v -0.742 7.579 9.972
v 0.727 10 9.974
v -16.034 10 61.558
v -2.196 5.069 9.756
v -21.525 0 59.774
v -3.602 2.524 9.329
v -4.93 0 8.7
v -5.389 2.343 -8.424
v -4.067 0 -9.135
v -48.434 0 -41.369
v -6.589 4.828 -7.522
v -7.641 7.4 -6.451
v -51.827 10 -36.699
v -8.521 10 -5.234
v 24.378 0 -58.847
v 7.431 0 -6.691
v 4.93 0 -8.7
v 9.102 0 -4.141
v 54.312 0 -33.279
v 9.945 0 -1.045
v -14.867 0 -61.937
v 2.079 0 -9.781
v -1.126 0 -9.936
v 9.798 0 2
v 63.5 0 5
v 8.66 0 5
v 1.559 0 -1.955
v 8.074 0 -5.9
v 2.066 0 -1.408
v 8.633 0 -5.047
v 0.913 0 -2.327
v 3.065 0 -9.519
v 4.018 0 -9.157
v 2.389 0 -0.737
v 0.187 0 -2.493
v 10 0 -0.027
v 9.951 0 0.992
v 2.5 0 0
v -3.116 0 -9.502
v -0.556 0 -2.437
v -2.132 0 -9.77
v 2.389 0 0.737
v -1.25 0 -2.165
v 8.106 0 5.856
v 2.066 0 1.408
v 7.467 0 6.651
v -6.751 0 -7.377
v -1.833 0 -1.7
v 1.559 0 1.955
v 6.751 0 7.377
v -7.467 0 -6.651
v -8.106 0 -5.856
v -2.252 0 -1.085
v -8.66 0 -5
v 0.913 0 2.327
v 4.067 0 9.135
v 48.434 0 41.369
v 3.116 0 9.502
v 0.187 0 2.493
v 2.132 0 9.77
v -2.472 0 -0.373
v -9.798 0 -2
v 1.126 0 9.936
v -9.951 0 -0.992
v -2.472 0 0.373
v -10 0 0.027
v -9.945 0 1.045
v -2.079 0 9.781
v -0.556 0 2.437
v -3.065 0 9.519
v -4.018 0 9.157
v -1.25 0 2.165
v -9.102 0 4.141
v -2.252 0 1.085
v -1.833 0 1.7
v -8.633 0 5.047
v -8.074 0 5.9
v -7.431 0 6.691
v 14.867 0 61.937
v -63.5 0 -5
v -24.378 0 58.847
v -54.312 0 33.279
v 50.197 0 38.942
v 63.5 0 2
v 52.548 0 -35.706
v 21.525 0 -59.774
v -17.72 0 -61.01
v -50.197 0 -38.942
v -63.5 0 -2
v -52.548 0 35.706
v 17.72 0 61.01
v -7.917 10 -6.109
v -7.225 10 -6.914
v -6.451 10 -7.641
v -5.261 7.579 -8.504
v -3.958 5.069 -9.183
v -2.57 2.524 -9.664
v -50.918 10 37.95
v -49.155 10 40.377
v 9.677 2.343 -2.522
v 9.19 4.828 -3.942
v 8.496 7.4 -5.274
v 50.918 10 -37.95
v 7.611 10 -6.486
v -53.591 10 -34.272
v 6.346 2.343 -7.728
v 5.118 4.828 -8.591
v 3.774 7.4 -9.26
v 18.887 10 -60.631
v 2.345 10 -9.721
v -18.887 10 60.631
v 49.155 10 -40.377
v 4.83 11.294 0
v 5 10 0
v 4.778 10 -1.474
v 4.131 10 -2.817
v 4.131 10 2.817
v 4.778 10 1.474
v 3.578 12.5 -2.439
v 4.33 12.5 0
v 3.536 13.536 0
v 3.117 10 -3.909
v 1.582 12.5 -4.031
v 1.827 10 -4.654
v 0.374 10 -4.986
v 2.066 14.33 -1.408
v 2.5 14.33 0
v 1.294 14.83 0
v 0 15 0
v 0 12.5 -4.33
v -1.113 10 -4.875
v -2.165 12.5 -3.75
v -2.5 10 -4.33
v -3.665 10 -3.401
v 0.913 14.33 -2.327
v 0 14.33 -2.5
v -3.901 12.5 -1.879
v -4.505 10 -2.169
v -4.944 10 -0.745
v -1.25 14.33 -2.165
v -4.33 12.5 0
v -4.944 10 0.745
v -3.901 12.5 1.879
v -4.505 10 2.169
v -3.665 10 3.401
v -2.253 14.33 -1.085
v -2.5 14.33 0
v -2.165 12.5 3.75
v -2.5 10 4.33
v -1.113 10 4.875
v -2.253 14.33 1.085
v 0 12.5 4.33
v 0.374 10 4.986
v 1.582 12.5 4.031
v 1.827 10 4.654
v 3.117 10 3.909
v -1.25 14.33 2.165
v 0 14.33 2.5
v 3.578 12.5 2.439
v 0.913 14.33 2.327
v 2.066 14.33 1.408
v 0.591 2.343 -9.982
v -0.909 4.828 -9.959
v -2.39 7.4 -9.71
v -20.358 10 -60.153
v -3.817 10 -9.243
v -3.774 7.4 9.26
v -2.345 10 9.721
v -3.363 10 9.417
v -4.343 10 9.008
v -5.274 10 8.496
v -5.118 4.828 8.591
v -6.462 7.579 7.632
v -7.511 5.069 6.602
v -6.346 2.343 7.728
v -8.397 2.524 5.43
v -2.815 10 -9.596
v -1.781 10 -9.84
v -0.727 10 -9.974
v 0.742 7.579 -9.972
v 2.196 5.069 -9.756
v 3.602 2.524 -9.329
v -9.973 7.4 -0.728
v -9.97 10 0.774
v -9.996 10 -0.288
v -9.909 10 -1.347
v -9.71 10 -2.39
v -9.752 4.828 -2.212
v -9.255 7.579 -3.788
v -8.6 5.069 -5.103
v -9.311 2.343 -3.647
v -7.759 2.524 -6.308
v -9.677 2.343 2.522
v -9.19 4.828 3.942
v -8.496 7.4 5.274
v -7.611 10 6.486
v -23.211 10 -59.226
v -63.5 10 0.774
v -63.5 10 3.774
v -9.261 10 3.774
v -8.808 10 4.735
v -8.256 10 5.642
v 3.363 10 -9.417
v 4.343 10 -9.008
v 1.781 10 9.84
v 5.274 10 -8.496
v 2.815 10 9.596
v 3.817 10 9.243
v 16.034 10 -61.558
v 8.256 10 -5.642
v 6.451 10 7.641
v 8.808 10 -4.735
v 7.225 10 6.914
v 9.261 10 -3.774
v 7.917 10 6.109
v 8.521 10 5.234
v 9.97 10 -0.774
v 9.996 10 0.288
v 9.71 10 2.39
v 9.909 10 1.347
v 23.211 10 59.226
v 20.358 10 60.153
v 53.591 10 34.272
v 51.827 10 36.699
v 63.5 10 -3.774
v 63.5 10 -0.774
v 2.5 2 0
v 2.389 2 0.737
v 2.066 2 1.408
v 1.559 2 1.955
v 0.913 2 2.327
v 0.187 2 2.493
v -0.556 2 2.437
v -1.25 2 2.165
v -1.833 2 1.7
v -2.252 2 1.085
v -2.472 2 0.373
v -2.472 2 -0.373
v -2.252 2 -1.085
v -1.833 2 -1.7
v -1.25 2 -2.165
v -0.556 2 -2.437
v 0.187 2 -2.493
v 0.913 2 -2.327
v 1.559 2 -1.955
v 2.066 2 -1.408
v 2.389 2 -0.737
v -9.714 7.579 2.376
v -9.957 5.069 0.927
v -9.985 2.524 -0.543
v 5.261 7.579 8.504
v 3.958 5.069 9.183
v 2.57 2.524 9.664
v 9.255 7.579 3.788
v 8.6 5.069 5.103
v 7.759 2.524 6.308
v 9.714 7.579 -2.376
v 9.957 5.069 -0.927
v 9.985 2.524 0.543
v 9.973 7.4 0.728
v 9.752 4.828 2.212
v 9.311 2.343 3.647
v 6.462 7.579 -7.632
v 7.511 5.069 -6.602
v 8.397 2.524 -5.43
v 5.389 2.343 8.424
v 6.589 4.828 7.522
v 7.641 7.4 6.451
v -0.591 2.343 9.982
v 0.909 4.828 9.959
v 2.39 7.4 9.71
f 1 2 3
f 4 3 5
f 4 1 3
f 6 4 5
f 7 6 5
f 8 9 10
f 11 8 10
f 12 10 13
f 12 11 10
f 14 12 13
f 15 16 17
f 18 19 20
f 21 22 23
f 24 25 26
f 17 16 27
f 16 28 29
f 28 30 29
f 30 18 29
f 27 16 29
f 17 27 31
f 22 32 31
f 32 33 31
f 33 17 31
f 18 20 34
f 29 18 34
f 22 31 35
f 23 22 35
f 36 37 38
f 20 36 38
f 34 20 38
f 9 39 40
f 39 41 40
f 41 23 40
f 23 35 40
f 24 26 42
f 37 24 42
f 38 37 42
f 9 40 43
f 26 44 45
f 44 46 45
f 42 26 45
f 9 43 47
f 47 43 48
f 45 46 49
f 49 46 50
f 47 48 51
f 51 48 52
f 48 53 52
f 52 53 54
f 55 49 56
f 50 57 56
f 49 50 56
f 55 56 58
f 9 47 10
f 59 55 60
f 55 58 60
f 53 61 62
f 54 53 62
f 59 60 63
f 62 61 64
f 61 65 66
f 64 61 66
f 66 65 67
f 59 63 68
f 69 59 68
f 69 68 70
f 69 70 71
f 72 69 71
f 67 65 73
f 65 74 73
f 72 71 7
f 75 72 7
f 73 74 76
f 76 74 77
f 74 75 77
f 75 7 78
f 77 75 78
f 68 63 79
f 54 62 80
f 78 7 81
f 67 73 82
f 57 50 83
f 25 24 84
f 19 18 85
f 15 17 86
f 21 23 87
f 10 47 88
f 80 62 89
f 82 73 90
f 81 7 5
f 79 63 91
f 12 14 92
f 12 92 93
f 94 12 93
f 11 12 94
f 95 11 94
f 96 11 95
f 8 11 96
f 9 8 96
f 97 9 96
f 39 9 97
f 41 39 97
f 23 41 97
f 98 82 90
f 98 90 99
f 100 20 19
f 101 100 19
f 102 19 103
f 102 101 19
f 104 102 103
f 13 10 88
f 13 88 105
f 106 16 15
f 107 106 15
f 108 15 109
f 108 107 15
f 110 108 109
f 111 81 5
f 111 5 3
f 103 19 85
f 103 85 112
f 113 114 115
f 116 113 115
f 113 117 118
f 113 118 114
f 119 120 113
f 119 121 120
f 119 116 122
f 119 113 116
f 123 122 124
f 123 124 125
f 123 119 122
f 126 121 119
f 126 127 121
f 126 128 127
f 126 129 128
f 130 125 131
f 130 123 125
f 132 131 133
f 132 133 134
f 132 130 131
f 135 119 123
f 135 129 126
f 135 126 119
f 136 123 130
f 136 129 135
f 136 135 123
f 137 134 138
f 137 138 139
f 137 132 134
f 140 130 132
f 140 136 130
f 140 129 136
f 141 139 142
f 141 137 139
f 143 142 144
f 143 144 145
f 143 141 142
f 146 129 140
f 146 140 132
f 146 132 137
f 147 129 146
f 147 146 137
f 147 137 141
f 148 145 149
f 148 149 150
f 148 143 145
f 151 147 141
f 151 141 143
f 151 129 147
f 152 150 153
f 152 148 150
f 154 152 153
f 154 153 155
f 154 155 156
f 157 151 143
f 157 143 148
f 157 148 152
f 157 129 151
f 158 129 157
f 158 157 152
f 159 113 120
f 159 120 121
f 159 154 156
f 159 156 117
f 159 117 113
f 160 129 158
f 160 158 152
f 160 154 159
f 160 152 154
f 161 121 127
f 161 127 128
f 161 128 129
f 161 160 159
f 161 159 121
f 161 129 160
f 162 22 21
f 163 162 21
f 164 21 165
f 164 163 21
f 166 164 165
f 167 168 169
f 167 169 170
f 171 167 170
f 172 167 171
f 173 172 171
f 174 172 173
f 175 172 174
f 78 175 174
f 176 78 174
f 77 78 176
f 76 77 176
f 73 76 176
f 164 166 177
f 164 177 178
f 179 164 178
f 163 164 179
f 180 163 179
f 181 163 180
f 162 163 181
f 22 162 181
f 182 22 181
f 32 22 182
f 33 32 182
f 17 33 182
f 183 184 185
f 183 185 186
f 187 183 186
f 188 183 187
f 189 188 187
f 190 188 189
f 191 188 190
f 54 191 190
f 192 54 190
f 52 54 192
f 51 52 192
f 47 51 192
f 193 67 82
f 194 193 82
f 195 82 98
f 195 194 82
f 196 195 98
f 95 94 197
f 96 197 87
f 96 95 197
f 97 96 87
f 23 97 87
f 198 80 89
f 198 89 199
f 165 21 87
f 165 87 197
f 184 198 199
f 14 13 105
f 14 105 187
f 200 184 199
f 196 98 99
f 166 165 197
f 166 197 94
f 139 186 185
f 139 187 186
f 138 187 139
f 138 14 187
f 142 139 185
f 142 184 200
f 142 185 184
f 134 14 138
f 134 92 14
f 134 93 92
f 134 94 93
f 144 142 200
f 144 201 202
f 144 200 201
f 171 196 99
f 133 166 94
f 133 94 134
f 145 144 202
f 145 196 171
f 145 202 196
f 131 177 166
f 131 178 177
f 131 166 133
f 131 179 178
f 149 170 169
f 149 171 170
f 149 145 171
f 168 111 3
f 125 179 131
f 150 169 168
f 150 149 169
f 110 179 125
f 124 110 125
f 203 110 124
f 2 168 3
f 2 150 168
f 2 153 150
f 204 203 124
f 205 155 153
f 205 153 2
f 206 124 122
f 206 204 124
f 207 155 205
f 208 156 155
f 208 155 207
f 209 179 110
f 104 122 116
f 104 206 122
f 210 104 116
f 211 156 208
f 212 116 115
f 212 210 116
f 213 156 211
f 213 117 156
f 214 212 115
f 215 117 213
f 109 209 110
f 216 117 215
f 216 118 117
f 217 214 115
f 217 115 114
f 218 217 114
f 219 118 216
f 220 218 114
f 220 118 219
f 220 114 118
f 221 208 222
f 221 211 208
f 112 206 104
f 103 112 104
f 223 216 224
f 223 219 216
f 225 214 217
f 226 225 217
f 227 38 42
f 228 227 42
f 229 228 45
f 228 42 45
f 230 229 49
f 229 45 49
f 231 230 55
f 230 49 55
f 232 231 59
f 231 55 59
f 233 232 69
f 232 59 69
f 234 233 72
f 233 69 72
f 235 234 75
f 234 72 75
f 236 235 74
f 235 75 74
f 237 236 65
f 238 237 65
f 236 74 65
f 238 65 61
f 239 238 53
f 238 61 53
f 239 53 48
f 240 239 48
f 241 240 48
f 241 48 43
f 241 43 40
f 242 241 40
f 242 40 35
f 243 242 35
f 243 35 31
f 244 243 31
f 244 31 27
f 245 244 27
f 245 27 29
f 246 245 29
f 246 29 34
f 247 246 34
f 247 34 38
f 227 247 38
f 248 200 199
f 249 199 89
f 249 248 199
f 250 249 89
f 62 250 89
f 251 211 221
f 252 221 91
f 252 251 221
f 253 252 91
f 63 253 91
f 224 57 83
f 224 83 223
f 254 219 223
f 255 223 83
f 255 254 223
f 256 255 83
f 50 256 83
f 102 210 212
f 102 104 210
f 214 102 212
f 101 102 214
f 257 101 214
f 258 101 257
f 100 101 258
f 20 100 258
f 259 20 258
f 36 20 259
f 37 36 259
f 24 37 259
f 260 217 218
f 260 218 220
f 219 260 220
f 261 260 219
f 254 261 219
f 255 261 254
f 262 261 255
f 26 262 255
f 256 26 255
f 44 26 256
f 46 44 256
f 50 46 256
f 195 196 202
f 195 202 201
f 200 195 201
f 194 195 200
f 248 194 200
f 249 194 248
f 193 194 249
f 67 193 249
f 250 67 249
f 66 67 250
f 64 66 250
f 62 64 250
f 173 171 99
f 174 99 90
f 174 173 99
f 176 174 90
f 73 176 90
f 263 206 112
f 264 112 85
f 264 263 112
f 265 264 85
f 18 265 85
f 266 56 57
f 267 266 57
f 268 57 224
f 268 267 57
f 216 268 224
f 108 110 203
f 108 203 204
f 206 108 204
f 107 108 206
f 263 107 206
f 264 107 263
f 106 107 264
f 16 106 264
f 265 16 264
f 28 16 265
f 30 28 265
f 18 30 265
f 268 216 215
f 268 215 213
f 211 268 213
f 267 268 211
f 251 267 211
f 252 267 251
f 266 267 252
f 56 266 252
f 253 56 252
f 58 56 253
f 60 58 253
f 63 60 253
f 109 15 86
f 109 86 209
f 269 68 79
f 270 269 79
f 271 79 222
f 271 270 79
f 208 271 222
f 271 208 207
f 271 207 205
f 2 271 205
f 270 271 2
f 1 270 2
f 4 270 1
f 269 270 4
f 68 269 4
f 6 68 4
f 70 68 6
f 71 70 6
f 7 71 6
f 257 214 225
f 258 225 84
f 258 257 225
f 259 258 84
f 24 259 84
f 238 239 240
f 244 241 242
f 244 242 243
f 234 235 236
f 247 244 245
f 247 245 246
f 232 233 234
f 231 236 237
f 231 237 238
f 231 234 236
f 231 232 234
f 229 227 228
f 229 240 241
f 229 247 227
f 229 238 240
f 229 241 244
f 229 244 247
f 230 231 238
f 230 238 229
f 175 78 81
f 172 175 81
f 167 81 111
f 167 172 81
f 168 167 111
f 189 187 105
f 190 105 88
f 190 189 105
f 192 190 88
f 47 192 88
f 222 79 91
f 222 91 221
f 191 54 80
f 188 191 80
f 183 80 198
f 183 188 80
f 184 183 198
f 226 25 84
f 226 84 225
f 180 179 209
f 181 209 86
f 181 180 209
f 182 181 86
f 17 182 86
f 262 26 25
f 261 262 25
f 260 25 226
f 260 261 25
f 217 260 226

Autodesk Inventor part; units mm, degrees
ref_plane "YZ Plane" through (0, 0, 0) normal (1, 0, 0) x (0, 1, 0)
ref_plane "XZ Plane" through (0, 0, 0) normal (0, 1, 0) x (-1, 0, 0)
ref_plane "XY Plane" through (0, 0, 0) normal (0, 0, 1) x (1, 0, 0)
sketch "Sketch1" plane through (0, 0, 0) normal (0, 1, 0) x (-1, 0, 0)
  circle A0 centre (0, 0) radius 10
  dimension "d0" = 20
extrude "Extrusion1" add sketch "Sketch1" along normal blind 10
sketch "Sketch3" plane through (0, 0, 0) normal (1, 0, 0) x (0, 1, 0)
  line L0 (0, 5) -> (10, -0.7735)
  line L1 (10, -0.7735) -> (10, -3.7735)
  line L2 (10, -3.7735) -> (0, 2)
  line L3 (0, 2) -> (0, 5)
  point P0 (0, 0)
  dimension "d3" = 3
  dimension "d4" = 10
  dimension "d5" = 10
  dimension "d6" = 60
  dimension "d7" = 5
extrude "Extrusion2" add sketch "Sketch3" along normal blind 63.5
pattern_circular "Circular Pattern1" count 10 over 360 about axis through (0, 0, 0) along (0, 1, 0) of "Extrusion2"
sketch "Sketch4" plane through (0, 10, 0) normal (0, 1, 0) x (1, 0, 0)
  circle A0 centre (0, 0) radius 5
  dimension "d13" = 10
extrude "Extrusion3" add sketch "Sketch4" along normal blind 5
fillet "Fillet1" radius 5 1 edges at (-5, 15, 0)
sketch "Sketch5" plane through (0, 0, 0) normal (0, -1, 0) x (1, 0, 0)
  circle A0 centre (0, 0) radius 2.5
  dimension "d17" = 5
extrude "Extrusion4" cut sketch "Sketch5" against normal blind 2
properties part number "AERO - Propeller" material "ABS Plastic"
